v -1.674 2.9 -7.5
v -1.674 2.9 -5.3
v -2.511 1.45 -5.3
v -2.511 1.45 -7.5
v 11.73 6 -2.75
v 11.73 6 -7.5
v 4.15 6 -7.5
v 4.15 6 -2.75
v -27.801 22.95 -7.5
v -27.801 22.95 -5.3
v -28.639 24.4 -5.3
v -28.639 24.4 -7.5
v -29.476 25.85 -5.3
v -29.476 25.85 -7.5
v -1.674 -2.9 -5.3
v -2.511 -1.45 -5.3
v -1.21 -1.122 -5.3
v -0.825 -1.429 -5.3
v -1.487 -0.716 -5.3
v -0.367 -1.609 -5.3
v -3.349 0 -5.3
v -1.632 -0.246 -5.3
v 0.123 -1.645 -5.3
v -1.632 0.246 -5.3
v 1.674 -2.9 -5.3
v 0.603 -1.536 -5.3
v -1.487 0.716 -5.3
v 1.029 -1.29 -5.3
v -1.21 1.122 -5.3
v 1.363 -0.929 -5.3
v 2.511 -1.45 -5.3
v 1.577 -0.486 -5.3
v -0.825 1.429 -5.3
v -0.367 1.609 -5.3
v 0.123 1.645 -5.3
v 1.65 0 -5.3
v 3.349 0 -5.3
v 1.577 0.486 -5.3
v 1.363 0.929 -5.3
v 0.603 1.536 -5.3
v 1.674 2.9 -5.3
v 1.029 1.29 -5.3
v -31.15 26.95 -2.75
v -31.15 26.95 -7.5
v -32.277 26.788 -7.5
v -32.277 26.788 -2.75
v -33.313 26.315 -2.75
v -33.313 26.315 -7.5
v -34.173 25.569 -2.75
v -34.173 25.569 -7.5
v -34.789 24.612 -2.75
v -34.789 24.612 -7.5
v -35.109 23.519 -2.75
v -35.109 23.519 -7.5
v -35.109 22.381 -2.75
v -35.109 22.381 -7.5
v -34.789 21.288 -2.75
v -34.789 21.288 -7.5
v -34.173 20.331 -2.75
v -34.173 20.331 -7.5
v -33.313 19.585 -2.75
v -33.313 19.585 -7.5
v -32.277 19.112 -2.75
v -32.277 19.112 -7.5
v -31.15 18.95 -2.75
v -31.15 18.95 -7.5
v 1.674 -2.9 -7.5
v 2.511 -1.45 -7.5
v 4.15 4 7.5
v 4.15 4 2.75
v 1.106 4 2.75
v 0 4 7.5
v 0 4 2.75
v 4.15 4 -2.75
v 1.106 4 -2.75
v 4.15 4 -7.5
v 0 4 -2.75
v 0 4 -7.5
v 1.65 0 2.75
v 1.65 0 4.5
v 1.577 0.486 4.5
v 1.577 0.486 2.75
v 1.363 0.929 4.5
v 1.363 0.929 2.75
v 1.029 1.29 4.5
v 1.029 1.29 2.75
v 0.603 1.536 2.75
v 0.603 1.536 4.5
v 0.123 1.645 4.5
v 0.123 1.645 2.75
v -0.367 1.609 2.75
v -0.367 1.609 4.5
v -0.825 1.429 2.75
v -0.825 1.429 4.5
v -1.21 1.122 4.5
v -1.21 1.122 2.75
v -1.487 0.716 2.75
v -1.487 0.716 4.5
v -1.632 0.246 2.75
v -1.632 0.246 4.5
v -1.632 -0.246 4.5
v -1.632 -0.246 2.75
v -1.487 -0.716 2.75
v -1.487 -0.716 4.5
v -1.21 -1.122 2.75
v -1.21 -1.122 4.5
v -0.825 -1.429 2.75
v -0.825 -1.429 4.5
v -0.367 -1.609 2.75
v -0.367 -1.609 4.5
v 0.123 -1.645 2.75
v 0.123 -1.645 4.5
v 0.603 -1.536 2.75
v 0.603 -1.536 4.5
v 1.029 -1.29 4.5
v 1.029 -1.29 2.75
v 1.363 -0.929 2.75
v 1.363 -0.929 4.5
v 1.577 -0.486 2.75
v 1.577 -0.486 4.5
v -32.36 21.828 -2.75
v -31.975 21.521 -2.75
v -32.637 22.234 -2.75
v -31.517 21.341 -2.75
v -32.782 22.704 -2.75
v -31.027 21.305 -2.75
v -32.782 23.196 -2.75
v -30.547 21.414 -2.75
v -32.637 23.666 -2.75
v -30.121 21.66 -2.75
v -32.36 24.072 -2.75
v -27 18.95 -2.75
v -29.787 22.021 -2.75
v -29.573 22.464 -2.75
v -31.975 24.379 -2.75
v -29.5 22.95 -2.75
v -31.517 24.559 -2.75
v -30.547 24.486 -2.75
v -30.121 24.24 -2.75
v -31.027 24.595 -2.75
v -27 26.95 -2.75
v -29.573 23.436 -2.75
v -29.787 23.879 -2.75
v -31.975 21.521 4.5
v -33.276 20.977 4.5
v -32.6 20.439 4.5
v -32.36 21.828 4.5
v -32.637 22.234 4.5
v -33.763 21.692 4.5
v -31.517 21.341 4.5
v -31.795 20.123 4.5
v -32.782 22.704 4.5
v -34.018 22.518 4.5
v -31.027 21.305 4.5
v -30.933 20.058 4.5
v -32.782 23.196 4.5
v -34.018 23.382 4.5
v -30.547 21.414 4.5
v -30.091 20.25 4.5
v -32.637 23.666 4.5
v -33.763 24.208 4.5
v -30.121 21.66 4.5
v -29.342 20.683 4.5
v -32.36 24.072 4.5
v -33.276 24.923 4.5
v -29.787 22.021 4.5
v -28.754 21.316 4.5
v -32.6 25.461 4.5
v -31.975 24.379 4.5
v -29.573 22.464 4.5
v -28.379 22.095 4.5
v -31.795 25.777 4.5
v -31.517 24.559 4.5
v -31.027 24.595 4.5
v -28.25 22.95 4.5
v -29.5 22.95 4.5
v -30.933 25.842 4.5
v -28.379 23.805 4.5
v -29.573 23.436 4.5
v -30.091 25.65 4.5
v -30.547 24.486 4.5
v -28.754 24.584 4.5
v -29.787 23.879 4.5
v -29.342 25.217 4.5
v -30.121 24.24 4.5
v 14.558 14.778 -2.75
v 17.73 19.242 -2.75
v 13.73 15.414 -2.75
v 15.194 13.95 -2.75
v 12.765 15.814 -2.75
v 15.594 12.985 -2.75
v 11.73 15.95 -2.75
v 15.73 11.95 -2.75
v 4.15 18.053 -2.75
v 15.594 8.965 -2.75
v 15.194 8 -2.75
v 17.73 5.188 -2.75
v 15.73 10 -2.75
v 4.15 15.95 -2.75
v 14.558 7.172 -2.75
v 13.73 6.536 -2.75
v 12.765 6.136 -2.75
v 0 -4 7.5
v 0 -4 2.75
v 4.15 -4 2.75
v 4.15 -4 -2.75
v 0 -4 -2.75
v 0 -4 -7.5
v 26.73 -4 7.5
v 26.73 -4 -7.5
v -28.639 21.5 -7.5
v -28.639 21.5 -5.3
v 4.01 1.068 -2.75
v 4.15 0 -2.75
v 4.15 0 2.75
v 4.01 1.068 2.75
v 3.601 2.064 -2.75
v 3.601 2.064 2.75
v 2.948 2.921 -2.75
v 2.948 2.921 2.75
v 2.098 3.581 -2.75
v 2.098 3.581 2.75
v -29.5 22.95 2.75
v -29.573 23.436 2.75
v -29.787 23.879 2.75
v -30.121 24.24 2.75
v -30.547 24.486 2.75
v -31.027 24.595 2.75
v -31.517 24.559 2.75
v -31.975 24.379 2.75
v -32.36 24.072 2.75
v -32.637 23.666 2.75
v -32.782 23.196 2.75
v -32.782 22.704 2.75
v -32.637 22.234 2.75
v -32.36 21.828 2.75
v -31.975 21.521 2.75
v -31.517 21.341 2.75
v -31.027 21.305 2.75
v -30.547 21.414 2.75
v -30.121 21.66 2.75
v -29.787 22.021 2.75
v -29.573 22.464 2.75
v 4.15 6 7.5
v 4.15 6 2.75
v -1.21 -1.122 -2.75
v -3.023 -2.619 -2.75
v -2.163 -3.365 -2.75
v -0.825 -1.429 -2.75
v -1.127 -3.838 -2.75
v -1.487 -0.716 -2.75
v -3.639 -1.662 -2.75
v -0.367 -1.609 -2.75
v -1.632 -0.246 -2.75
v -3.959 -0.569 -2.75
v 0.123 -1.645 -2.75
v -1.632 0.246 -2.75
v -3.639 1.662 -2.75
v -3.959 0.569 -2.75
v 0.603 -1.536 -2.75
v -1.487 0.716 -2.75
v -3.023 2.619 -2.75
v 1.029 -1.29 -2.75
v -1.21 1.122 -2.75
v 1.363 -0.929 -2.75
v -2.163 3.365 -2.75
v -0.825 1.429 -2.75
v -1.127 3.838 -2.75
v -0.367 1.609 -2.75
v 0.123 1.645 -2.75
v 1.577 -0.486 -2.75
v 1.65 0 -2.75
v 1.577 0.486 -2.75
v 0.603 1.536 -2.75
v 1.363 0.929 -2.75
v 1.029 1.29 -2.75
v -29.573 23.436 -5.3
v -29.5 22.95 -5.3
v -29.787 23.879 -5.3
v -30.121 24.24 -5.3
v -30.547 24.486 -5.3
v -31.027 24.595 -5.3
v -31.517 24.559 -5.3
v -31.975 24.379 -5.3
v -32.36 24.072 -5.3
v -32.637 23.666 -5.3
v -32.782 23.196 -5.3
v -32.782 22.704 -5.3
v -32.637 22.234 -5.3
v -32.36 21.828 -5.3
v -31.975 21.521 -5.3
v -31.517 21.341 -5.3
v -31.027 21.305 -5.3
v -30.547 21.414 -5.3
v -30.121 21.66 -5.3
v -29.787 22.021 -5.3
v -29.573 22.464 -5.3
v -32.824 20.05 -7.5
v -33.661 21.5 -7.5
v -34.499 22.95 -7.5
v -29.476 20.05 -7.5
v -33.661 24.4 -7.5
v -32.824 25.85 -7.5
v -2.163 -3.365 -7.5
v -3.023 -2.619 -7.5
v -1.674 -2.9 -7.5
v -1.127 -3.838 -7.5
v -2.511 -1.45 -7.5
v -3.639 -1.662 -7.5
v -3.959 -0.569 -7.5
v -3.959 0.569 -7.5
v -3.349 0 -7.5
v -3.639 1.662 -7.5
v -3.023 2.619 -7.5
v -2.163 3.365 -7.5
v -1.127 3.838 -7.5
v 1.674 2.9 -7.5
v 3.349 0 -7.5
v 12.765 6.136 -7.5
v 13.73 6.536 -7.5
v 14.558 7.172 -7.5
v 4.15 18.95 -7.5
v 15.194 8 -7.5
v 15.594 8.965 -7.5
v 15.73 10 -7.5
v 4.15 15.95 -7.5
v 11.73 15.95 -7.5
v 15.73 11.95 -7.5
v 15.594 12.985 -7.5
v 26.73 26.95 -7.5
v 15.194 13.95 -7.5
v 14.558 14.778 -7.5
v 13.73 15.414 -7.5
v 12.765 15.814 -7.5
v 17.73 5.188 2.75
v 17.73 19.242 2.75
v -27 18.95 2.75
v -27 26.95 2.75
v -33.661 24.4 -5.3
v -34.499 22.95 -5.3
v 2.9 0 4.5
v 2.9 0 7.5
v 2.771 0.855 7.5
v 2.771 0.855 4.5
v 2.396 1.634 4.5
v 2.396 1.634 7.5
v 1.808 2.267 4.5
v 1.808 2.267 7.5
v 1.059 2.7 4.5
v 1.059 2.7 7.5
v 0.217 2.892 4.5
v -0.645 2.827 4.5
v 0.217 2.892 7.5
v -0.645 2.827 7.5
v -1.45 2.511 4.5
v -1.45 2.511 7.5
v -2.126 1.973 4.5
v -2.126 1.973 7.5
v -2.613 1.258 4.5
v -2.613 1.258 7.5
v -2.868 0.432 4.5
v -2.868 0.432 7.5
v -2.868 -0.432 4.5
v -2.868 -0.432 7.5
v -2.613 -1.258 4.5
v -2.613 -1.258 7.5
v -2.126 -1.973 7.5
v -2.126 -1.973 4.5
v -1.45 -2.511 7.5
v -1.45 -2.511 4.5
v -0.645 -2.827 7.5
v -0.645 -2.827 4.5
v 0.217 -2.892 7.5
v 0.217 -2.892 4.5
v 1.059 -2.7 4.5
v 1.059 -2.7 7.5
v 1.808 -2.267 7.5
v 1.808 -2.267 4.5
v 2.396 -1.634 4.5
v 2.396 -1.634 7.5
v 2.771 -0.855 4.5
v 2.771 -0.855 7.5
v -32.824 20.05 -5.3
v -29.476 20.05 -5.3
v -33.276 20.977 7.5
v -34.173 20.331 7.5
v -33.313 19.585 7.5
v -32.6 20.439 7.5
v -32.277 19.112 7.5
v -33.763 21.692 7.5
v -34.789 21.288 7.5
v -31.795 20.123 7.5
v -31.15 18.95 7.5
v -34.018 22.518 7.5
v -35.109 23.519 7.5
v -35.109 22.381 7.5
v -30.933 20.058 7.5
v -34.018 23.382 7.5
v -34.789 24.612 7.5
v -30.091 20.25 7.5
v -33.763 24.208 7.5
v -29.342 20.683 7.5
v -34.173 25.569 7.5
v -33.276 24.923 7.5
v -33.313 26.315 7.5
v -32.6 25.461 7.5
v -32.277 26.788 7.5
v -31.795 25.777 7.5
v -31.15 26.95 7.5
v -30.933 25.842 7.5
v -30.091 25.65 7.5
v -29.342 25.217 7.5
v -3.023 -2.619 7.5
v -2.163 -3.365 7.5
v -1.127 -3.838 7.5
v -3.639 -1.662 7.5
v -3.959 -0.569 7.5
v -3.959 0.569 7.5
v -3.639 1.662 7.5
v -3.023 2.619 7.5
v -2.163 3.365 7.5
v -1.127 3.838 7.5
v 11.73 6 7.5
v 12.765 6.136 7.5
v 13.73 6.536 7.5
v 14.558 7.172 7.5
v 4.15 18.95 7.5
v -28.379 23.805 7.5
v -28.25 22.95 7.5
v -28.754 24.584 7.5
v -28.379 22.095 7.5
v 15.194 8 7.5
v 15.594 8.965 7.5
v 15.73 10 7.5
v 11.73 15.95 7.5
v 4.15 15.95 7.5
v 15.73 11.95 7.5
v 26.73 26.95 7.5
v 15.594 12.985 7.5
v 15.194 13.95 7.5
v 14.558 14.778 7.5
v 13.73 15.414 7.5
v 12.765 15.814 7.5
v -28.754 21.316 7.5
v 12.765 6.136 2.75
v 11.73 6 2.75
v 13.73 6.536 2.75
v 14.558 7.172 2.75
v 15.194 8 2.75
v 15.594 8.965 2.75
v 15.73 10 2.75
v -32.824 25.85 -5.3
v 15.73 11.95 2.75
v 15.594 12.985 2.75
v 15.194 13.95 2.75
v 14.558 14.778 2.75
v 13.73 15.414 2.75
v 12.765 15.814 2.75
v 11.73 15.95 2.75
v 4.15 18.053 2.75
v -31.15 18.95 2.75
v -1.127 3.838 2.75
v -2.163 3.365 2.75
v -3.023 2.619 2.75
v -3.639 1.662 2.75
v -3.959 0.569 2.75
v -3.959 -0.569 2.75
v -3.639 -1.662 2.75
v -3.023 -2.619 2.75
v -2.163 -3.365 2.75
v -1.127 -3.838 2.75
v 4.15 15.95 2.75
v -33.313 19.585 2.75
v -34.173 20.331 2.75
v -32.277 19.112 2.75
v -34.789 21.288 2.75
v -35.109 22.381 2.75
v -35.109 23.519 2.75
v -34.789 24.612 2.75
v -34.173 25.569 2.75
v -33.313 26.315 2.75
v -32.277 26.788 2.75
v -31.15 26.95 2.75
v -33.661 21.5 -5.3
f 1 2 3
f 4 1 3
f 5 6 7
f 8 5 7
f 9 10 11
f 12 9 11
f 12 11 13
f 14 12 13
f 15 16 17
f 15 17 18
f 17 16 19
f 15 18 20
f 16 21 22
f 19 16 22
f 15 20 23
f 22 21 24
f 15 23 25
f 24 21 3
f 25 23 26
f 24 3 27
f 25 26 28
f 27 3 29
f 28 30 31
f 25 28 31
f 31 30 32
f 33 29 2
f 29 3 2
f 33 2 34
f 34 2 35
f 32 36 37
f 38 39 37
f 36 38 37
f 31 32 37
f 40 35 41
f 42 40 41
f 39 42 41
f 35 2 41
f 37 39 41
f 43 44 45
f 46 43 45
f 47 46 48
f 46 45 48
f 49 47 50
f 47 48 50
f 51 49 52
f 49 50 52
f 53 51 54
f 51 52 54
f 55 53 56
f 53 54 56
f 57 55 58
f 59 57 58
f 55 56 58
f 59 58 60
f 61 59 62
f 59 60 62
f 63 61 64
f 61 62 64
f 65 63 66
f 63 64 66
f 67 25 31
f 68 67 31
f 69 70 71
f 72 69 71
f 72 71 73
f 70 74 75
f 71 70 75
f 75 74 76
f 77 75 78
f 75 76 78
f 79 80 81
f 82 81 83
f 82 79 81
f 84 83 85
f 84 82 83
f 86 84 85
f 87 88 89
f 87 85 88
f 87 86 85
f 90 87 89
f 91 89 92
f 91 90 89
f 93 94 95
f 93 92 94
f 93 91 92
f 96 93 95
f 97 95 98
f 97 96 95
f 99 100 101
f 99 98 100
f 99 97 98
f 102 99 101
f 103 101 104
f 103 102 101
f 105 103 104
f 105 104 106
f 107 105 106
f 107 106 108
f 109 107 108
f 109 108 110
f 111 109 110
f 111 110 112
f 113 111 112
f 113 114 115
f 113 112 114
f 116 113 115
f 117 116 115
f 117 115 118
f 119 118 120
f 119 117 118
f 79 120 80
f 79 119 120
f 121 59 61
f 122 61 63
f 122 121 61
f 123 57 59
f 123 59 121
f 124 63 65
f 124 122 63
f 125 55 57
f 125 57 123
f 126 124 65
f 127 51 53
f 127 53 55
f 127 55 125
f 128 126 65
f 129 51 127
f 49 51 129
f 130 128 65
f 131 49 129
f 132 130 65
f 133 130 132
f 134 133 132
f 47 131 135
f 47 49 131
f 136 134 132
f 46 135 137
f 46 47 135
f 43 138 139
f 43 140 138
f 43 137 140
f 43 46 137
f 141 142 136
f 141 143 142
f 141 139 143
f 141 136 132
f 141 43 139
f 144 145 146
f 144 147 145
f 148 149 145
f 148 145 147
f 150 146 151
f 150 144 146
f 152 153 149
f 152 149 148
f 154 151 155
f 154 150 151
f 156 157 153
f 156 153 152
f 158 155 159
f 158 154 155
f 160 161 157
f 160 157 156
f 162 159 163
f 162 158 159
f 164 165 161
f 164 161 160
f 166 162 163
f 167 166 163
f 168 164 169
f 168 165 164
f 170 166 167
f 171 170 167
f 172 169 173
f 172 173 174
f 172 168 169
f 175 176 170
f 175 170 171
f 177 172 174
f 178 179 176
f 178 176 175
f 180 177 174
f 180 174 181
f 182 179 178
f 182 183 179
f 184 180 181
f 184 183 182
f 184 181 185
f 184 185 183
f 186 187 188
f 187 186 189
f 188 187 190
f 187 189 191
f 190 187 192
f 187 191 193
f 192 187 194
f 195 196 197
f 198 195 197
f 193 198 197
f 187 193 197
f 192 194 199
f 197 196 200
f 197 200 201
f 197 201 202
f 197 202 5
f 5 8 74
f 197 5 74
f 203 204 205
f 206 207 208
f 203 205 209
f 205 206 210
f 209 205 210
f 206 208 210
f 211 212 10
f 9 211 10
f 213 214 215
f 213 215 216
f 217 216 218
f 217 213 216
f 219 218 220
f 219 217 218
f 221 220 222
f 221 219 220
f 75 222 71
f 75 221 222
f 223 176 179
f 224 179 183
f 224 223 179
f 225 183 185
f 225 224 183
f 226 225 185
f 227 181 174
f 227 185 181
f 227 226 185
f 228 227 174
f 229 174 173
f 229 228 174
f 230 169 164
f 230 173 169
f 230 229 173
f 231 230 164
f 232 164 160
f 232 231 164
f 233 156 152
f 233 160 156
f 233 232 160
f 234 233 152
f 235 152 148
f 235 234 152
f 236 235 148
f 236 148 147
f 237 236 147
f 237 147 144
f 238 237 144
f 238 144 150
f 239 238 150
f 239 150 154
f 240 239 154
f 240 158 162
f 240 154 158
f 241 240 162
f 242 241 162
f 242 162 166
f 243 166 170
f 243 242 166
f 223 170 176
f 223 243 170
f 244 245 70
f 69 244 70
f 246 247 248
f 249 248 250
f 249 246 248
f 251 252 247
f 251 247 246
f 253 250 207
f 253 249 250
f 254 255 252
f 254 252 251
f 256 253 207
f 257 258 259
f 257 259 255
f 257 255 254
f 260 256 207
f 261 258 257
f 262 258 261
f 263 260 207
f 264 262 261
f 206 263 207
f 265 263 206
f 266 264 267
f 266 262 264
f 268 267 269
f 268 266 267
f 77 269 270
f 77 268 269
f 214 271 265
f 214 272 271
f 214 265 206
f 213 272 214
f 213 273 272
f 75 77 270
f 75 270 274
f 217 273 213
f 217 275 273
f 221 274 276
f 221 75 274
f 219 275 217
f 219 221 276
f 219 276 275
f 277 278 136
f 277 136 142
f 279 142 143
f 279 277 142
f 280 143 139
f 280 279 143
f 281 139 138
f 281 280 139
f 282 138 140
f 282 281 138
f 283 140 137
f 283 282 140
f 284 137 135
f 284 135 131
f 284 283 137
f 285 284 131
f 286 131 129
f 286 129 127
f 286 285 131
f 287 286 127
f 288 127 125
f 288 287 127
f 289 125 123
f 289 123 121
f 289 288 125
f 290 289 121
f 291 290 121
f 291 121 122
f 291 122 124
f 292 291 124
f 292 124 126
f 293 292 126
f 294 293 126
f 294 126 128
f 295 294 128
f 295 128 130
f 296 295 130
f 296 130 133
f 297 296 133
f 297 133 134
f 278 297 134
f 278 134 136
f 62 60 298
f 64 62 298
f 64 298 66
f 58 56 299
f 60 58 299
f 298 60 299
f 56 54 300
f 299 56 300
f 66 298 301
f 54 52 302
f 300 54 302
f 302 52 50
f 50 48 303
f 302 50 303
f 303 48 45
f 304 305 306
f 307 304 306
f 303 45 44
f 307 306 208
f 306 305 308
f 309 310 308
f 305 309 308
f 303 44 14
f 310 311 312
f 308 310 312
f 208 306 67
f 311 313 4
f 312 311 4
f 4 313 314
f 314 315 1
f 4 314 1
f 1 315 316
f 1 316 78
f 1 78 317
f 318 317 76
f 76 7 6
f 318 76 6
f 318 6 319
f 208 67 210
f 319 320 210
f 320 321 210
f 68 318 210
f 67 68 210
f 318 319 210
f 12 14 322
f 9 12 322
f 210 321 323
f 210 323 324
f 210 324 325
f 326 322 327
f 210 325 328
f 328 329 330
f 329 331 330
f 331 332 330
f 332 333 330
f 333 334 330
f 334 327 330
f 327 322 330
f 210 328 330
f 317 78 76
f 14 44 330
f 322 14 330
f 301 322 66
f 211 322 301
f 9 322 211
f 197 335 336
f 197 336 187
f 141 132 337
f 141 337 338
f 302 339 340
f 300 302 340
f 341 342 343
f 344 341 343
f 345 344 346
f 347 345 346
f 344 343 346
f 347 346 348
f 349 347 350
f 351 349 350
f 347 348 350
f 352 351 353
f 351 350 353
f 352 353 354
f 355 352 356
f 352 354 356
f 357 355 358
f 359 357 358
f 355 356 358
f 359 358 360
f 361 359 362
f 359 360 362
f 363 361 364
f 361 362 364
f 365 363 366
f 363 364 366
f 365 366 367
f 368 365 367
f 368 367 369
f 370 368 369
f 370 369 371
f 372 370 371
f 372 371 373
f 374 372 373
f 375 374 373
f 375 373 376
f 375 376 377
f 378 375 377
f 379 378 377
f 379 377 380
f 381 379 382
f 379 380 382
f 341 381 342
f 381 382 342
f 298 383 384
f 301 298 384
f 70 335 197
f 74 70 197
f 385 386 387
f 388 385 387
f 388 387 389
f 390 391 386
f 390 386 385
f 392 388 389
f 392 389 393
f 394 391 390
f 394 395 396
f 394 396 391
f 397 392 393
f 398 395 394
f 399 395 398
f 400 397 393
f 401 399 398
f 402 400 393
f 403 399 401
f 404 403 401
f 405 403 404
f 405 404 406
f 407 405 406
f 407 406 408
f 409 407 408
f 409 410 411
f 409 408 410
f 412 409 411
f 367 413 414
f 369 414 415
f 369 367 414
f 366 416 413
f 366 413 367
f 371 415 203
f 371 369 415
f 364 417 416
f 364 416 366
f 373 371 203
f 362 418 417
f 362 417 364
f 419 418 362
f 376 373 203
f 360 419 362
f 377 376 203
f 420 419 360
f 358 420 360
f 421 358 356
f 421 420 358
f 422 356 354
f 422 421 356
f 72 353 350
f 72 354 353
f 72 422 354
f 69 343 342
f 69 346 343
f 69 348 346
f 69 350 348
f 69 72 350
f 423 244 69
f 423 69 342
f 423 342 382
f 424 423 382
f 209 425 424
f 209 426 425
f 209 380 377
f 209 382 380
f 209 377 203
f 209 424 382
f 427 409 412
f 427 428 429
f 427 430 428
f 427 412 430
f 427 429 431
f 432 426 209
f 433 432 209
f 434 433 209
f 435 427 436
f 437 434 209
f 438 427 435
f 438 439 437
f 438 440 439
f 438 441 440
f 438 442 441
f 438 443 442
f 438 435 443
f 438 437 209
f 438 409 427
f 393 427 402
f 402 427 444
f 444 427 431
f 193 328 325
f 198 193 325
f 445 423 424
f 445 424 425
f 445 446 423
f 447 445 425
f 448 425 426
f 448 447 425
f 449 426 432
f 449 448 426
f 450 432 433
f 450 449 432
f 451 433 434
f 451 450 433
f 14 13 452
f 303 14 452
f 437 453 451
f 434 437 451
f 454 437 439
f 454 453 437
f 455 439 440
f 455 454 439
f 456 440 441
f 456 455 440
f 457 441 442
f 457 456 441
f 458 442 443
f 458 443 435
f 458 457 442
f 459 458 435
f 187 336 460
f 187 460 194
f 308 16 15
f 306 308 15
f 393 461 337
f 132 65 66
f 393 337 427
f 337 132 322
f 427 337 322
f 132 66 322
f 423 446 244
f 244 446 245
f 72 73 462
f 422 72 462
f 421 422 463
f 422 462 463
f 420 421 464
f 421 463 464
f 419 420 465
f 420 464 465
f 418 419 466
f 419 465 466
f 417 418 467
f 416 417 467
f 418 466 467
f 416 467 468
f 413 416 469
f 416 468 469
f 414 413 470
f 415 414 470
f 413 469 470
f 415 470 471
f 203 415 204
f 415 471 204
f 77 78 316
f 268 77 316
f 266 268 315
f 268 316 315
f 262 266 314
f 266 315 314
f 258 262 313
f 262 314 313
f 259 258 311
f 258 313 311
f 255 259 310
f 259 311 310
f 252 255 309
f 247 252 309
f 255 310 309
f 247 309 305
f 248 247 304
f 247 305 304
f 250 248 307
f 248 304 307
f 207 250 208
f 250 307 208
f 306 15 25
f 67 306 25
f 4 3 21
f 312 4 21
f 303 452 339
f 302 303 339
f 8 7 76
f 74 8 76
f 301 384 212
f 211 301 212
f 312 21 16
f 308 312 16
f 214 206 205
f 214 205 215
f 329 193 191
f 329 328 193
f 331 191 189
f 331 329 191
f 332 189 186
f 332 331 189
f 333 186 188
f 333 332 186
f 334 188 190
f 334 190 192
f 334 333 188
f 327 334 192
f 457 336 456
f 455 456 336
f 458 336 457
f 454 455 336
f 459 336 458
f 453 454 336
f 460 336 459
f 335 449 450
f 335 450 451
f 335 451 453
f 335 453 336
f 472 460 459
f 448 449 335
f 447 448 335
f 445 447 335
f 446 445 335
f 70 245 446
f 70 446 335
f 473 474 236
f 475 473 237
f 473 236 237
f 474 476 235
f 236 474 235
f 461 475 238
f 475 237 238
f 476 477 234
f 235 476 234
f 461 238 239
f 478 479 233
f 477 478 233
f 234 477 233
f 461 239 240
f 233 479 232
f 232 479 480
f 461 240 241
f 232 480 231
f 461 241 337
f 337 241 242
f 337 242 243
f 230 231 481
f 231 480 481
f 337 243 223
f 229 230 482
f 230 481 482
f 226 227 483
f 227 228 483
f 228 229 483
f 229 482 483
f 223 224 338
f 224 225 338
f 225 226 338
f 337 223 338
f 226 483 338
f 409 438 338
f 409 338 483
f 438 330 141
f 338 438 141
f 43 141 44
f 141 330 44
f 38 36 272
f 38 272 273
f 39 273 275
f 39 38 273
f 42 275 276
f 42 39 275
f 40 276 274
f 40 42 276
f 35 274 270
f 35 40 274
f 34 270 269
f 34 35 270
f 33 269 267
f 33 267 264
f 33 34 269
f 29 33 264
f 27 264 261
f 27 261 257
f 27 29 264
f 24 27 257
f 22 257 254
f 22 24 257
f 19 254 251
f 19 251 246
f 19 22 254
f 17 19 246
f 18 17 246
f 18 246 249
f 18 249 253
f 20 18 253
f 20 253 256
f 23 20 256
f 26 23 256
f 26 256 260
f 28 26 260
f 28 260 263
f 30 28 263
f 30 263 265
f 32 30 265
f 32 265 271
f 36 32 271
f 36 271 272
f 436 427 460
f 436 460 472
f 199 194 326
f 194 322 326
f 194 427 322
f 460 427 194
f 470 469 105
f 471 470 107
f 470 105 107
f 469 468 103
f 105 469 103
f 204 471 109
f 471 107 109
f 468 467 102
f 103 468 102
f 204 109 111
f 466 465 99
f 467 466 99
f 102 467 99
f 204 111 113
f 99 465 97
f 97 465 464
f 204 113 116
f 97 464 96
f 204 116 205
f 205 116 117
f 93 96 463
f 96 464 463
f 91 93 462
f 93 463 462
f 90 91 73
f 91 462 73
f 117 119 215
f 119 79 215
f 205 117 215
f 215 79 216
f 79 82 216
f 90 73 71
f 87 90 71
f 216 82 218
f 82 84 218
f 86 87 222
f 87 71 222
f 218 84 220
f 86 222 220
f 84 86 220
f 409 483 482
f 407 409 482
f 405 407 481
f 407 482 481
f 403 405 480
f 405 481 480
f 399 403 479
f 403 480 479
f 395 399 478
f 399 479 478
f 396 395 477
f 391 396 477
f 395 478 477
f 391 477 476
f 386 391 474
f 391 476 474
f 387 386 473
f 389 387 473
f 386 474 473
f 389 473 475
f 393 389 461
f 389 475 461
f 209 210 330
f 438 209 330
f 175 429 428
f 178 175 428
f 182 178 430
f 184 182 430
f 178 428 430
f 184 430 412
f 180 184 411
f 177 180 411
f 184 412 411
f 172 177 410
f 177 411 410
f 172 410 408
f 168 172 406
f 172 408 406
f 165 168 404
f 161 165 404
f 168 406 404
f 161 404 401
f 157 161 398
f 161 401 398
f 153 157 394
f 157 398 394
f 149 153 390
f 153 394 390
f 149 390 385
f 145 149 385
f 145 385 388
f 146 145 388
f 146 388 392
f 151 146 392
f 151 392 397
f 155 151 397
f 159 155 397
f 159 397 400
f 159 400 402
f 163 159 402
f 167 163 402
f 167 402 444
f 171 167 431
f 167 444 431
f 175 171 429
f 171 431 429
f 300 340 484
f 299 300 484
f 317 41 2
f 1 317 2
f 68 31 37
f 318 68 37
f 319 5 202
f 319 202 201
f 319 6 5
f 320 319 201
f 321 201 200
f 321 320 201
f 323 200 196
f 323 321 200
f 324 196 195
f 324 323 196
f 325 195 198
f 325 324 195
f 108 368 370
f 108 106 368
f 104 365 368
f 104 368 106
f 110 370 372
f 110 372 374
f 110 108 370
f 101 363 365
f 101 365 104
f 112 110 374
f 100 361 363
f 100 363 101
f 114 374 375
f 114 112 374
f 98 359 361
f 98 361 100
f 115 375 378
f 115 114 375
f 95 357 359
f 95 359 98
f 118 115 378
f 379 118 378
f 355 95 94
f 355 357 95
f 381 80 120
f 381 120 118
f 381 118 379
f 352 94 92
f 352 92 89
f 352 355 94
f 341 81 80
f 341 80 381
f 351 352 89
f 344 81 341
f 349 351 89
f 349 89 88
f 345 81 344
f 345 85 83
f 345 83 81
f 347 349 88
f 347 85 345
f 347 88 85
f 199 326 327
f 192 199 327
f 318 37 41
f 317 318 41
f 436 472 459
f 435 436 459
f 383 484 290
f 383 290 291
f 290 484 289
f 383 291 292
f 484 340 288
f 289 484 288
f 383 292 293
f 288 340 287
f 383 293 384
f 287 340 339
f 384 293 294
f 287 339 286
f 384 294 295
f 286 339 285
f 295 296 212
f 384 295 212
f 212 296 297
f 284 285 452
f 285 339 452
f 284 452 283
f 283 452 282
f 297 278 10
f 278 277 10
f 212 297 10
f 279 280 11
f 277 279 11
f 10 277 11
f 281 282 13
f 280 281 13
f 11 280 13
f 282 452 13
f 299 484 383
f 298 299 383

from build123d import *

# Parameters (mm, degrees)
BOSS_EXTRUDE1_DEPTH      = 4.75
BOSS_EXTRUDE1_DEPTH_BACK = 4.75
SKETCH1_R                = 1.65
BOSS_EXTRUDE3_START      = -7.5
BOSS_EXTRUDE3_OUTLINE_R  = 1.65
BOSS_EXTRUDE3_DEPTH      = 15
CUT_EXTRUDE1_START       = -2.75
CUT_EXTRUDE1_OUTLINE_R   = 1.65
CUT_EXTRUDE1_DEPTH       = 5.5
CUT_EXTRUDE2_REACH       = 117.308
SKETCH3_W                = 5.5
SKETCH3_H                = 14
FILLET1_R                = 4
CUT_EXTRUDE3_START       = 7.5
SKETCH4_R                = 2.9
CUT_EXTRUDE3_DEPTH       = 3
CUT_EXTRUDE4_START       = -5.3
SKETCH4_4_R              = 2.9
CUT_EXTRUDE4_DEPTH       = 2.2


# Read off the part's stored shape, not the designer's step: Boss-Extrude3, Cut-Extrude1
with BuildPart() as part:
    # Sketch1 → Boss-Extrude1 (new, two sides: drawn at the far end of the back side and taken through both)
    with BuildSketch(Plane.XY.offset(-BOSS_EXTRUDE1_DEPTH_BACK)):
        with BuildLine():
            ThreePointArc((0, 4), (-4, 0), (0, -4))
            Line((0, -4), (26.73, -4))
            Line((26.73, -4), (26.73, 26.95))
            Line((26.73, 26.95), (-31.15, 26.95))
            ThreePointArc((-31.15, 26.95), (-35.15, 22.95), (-31.15, 18.95))
            Line((-31.15, 18.95), (4.15, 18.95))
            Line((4.15, 18.95), (4.15, 15.95))
            Line((4.15, 15.95), (15.73, 15.95))
            Line((15.73, 15.95), (15.73, 6))
            Line((15.73, 6), (4.15, 6))
            Line((4.15, 6), (4.15, 4))
            Line((4.15, 4), (0, 4))
        make_face()
        Circle(SKETCH1_R, mode=Mode.SUBTRACT)
        Polygon((-27.685898385, 22.95), (-29.417949192, 19.95), (-32.882050808, 19.95), (-34.614101615, 22.95), (-32.882050808, 25.95), (-29.417949192, 25.95), align=None, mode=Mode.SUBTRACT)
    extrude(amount=BOSS_EXTRUDE1_DEPTH + BOSS_EXTRUDE1_DEPTH_BACK)

    # Boss-Extrude3 outline → Boss-Extrude3 (add)
    with BuildSketch(Plane.XY.offset(BOSS_EXTRUDE3_START)):
        with BuildLine():
            Line((4.15, 4), (0, 4))
            ThreePointArc((0, 4), (-4, 0), (0, -4))
            Line((0, -4), (26.73, -4))
            Line((26.73, -4), (26.73, 26.95))
            Line((26.73, 26.95), (-31.15, 26.95))
            ThreePointArc((-31.15, 26.95), (-35.15, 22.95), (-31.15, 18.95))
            Line((-31.15, 18.95), (4.15, 18.95))
            Line((4.15, 18.95), (4.15, 15.95))
            Line((4.15, 15.95), (15.73, 15.95))
            Line((15.73, 15.95), (15.73, 6))
            Line((15.73, 6), (4.15, 6))
            Line((4.15, 6), (4.15, 4))
        make_face()
        Circle(BOSS_EXTRUDE3_OUTLINE_R, mode=Mode.SUBTRACT)
        with Locations((-31.15, 22.95)):
            Circle(BOSS_EXTRUDE3_OUTLINE_R, mode=Mode.SUBTRACT)
    extrude(amount=BOSS_EXTRUDE3_DEPTH)

    # Cut-Extrude1 outline → Cut-Extrude1 (cut)
    # profile 1 of 2: a face of its own
    with BuildSketch(Plane.XY.offset(CUT_EXTRUDE1_START)):
        with BuildLine():
            Line((0, -4), (4.15, -4))
            Line((4.15, -4), (4.15, 0))
            ThreePointArc((4.15, 0), (3.302349085, 2.513362393), (1.105667219, 4))
            Line((1.105667219, 4), (0, 4))
            ThreePointArc((0, 4), (-4, 0), (0, -4))
        make_face()
        Circle(CUT_EXTRUDE1_OUTLINE_R, mode=Mode.SUBTRACT)
    # profile 2 of 2: a face of its own
    with BuildSketch(Plane.XY.offset(CUT_EXTRUDE1_START)):
        with BuildLine():
            Line((-27, 18.95), (-27, 26.95))
            Line((-27, 26.95), (-31.15, 26.95))
            ThreePointArc((-31.15, 26.95), (-35.15, 22.95), (-31.15, 18.95))
            Line((-31.15, 18.95), (-27, 18.95))
        make_face()
        with Locations((-31.15, 22.95)):
            Circle(CUT_EXTRUDE1_OUTLINE_R, mode=Mode.SUBTRACT)
    extrude(amount=CUT_EXTRUDE1_DEPTH, mode=Mode.SUBTRACT)

    # Cut-Extrude2: up to this plane
    cut_extrude2_end = Plane(origin=(17.73, 0, -4.75), z_dir=(-1, 0, 0))
    # Sketch3 → Cut-Extrude2 (cut, up to the surface)
    with BuildSketch(Plane(origin=(-4.830790631, 106.650906635, 0), x_dir=(0, 0, -1), z_dir=(-0.9961946980917455, -0.08715574274765839, 0)), mode=Mode.PRIVATE) as cut_extrude2_sk1:
        with Locations((0, 96.043016422)):
            Rectangle(SKETCH3_W, SKETCH3_H)
    cut_extrude2_tool1 = split(extrude(cut_extrude2_sk1.sketch, amount=-CUT_EXTRUDE2_REACH, mode=Mode.PRIVATE), bisect_by=cut_extrude2_end, keep=Keep.BOTH, mode=Mode.PRIVATE)
    add(cut_extrude2_tool1.solids().sort_by_distance((3.53991, 10.973363, 0))[0], mode=Mode.SUBTRACT)

    # Fillet1
    fillet1_edges = [part.edges().sort_by_distance(p)[0] for p in [
        (15.73, 6, 5.125),
        (15.73, 15.95, 5.125),
        (15.73, 6, -5.125),
        (15.73, 15.95, -5.125),
    ]]
    fillet(fillet1_edges, radius=FILLET1_R)

    # Sketch4 → Cut-Extrude3 (cut)
    with BuildSketch(Plane.XY.offset(CUT_EXTRUDE3_START)):
        with Locations((-31.15, 22.95)):
            Circle(SKETCH4_R)
        Circle(SKETCH4_R)
    extrude(amount=-CUT_EXTRUDE3_DEPTH, mode=Mode.SUBTRACT)

    # Sketch4<4> → Cut-Extrude4 (cut)
    with BuildSketch(Plane.XY.offset(CUT_EXTRUDE4_START)):
        Circle(SKETCH4_4_R)
        with BuildLine():
            Line((-1.674315781, -2.9), (0, -2.9))
            ThreePointArc((0, -2.9), (-1.450000053, -2.511473641), (-2.511473732, -1.449999895))
            Line((-2.511473732, -1.449999895), (-1.674315781, -2.9))
        make_face()
        with BuildLine():
            ThreePointArc((-2.511473732, -1.449999895), (-2.9, 9e-09), (-2.511473723, 1.44999991))
            Line((-2.511473723, 1.44999991), (-3.348631561, 0))
            Line((-3.348631561, 0), (-2.511473732, -1.449999895))
        make_face()
        with BuildLine():
            ThreePointArc((-2.511473723, 1.44999991), (-1.45000005, 2.511473642), (-1.2e-08, 2.9))
            Line((-1.2e-08, 2.9), (-1.674315781, 2.9))
            Line((-1.674315781, 2.9), (-2.511473723, 1.44999991))
        make_face()
        with BuildLine():
            ThreePointArc((-1.2e-08, 2.9), (1.449999995, 2.511473674), (2.511473671, 1.45))
            Line((2.511473671, 1.45), (1.674315781, 2.9))
            Line((1.674315781, 2.9), (-1.2e-08, 2.9))
        make_face()
        with BuildLine():
            Line((2.511473679, -1.449999986), (3.348631561, 0))
            Line((3.348631561, 0), (2.511473671, 1.45))
            ThreePointArc((2.511473671, 1.45), (2.801184896, 0.750575231), (2.9, 0))
            ThreePointArc((2.9, 0), (2.801184898, -0.750575223), (2.511473679, -1.449999986))
        make_face()
        with BuildLine():
            Line((1.674315781, -2.9), (2.511473679, -1.449999986))
            ThreePointArc((2.511473679, -1.449999986), (1.450000007, -2.511473667), (0, -2.9))
            Line((0, -2.9), (1.674315781, -2.9))
        make_face()
        with Locations((-31.15, 22.95)):
            Circle(SKETCH4_4_R)
        with BuildLine():
            Line((-29.475684219, 20.05), (-28.638526291, 21.500000065))
            ThreePointArc((-28.638526291, 21.500000065), (-29.699999968, 20.438526348), (-31.15, 20.05))
            Line((-31.15, 20.05), (-29.475684219, 20.05))
        make_face()
        with BuildLine():
            Line((-28.638526291, 21.500000065), (-27.801368439, 22.95))
            Line((-27.801368439, 22.95), (-28.638526352, 24.40000004))
            ThreePointArc((-28.638526352, 24.40000004), (-28.34881511, 23.700575253), (-28.25, 22.95))
            ThreePointArc((-28.25, 22.95), (-28.348815094, 22.199424805), (-28.638526291, 21.500000065))
        make_face()
        with BuildLine():
            ThreePointArc((-31.150000038, 25.85), (-29.700000036, 25.461473692), (-28.638526352, 24.40000004))
            Line((-28.638526352, 24.40000004), (-29.475684219, 25.85))
            Line((-29.475684219, 25.85), (-31.150000038, 25.85))
        make_face()
        with BuildLine():
            ThreePointArc((-33.661473709, 24.399999935), (-32.600000049, 25.461473643), (-31.150000038, 25.85))
            Line((-31.150000038, 25.85), (-32.824315781, 25.85))
            Line((-32.824315781, 25.85), (-33.661473709, 24.399999935))
        make_face()
        with BuildLine():
            ThreePointArc((-33.661473549, 21.499999789), (-34.05, 22.949999841), (-33.661473709, 24.399999935))
            Line((-33.661473709, 24.399999935), (-34.498631561, 22.95))
            Line((-34.498631561, 22.95), (-33.661473549, 21.499999789))
        make_face()
        with BuildLine():
            Line((-32.824315781, 20.05), (-31.15, 20.05))
            ThreePointArc((-31.15, 20.05), (-32.599999895, 20.438526268), (-33.661473549, 21.499999789))
            Line((-33.661473549, 21.499999789), (-32.824315781, 20.05))
        make_face()
    extrude(amount=-CUT_EXTRUDE4_DEPTH, mode=Mode.SUBTRACT)


solid = part.part
